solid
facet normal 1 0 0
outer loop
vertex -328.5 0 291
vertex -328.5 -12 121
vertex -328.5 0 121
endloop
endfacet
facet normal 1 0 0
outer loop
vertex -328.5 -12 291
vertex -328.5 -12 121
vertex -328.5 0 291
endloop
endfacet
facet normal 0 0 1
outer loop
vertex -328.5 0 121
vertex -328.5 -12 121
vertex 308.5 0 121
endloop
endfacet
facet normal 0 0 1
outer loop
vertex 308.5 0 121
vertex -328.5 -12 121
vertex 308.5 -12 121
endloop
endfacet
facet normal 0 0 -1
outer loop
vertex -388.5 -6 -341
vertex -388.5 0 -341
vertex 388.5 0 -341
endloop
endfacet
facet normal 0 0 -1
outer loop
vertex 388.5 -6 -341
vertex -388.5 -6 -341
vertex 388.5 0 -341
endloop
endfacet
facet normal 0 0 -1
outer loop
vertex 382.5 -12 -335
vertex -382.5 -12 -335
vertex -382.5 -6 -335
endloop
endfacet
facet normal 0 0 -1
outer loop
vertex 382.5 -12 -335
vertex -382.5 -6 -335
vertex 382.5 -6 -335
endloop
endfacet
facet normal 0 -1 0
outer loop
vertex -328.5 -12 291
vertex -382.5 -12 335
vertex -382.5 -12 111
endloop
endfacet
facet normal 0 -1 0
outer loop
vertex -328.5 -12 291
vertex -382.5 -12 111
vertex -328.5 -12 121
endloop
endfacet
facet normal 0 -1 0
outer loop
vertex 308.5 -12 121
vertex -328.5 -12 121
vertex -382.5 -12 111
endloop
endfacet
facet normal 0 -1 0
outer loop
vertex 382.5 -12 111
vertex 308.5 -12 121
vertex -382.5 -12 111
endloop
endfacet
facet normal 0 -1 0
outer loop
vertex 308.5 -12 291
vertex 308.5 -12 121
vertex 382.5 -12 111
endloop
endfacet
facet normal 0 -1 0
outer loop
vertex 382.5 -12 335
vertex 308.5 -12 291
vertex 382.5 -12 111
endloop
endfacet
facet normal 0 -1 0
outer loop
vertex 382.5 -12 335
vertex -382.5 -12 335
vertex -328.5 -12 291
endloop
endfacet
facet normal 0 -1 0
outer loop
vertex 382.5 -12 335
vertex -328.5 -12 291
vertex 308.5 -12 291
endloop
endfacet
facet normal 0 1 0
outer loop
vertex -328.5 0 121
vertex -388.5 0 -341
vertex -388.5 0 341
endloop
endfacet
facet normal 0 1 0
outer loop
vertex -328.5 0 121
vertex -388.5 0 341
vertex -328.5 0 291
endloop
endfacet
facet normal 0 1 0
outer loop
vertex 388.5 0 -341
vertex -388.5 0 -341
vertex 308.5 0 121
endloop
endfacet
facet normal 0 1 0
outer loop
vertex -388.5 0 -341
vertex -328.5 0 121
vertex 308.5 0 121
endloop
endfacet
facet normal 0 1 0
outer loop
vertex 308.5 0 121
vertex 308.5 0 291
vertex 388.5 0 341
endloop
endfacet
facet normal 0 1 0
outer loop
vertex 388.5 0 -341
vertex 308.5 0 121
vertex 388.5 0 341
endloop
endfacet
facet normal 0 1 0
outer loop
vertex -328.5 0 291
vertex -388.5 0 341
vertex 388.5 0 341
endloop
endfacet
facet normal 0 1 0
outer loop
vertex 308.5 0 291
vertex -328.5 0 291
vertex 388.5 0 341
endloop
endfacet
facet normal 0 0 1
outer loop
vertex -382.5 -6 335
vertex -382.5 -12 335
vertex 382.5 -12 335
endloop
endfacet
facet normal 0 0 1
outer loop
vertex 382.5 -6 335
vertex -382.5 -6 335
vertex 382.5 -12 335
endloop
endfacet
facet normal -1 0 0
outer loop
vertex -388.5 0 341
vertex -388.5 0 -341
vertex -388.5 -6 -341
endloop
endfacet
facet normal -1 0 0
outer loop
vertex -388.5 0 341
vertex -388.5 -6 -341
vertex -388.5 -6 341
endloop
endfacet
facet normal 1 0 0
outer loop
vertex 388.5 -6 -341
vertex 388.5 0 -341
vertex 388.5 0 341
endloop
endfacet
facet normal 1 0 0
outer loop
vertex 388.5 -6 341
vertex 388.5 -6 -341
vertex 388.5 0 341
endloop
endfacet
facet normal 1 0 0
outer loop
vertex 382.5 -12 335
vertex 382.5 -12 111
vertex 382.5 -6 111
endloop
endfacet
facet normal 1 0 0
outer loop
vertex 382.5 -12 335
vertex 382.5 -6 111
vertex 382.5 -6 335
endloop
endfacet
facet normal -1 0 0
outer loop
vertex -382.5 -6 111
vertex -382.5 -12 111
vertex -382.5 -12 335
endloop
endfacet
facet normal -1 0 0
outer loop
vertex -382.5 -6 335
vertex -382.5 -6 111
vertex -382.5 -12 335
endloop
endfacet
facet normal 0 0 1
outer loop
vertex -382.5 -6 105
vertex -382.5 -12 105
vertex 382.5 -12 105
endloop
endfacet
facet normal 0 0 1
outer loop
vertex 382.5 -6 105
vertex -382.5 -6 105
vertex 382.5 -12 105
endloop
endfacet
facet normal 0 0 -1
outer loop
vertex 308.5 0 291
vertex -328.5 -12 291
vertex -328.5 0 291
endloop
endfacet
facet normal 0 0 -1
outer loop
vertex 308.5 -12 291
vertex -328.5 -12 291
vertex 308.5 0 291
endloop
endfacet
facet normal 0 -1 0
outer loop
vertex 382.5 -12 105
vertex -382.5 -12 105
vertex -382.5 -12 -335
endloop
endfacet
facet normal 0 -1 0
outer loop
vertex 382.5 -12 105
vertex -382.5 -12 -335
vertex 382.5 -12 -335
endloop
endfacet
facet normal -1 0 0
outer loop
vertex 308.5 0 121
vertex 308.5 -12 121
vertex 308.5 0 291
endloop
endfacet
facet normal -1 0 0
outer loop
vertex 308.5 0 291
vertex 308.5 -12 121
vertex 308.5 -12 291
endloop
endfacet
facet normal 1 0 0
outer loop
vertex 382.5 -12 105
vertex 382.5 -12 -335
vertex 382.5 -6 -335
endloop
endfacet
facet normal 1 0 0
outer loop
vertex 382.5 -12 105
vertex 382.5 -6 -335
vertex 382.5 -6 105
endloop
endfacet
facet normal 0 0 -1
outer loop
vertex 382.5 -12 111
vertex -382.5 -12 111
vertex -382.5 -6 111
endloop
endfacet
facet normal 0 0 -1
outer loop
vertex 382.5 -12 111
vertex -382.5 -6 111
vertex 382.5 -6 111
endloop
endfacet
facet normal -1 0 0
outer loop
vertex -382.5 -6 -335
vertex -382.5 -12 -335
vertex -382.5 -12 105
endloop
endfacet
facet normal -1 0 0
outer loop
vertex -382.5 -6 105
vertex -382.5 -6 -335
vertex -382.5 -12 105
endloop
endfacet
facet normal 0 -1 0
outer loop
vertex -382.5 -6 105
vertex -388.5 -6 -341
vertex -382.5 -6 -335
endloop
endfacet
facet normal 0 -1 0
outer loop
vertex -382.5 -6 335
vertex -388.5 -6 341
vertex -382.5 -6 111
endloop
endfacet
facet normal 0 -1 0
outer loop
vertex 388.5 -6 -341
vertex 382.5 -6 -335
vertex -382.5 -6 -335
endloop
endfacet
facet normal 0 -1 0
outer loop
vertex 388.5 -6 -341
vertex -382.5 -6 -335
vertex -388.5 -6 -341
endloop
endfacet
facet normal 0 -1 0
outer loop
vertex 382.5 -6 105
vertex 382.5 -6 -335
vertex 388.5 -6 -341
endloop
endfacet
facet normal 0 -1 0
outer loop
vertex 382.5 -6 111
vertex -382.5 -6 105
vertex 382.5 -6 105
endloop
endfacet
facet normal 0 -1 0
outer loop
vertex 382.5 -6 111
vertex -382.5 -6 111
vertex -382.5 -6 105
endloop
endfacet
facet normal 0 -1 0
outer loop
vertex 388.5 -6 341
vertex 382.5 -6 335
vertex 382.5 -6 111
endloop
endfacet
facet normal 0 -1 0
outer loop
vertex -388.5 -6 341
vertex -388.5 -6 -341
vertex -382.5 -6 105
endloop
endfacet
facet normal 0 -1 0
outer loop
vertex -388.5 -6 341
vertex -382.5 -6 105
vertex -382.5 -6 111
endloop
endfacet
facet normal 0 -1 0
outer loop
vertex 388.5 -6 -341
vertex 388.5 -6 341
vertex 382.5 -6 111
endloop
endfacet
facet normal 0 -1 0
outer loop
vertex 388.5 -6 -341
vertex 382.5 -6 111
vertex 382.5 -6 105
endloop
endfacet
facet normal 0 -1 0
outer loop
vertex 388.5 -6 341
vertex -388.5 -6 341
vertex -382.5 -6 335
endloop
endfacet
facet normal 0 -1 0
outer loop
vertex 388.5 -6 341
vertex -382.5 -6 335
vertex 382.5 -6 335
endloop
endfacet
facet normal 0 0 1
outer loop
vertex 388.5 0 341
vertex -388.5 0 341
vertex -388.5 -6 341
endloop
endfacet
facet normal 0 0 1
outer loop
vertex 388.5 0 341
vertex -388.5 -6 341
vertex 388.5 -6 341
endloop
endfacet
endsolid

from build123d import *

# Parameters (mm, degrees)
F0_W      = 777
F0_H      = 682
F1_DEPTH  = 12
F2_W      = 777
F2_H      = 6
F3_DEPTH  = 6
F4_W      = 637
F4_H      = 170
F5_DEPTH  = 12
F6_W      = 777
F6_H      = 6
F7_DEPTH  = 6
F8_W      = 6
F8_H      = 676
F9_DEPTH  = 6
F10_W     = 6
F10_H     = 676
F11_DEPTH = 6
F12_W     = 765
F12_H     = 6
F13_DEPTH = 6


with BuildPart() as f1:
    # F0 (on Front) → F1 (new body)
    with BuildSketch(Plane.XZ):
        Rectangle(F0_W, F0_H)
    extrude(amount=F1_DEPTH)

    # F2 (on face) → F3 (cut)
    with BuildSketch(Plane.XZ.offset(12)):
        with Locations((0, 108)):
            Rectangle(F2_W, F2_H)
    extrude(amount=-F3_DEPTH, mode=Mode.SUBTRACT)

    # F4 (on face) → F5 (cut, through all)
    with BuildSketch(Plane.XZ.offset(12)):
        with Locations((-10, 206)):
            Rectangle(F4_W, F4_H)
    extrude(amount=-F5_DEPTH, mode=Mode.SUBTRACT)

    # F6 (on face) → F7 (cut)
    with BuildSketch(Plane.XZ.offset(12)):
        with Locations((0, 338)):
            Rectangle(F6_W, F6_H)
    extrude(amount=-F7_DEPTH, mode=Mode.SUBTRACT)

    # F8 (on face) → F9 (cut)
    with BuildSketch(Plane.XZ.offset(12)):
        with Locations((-385.5, -3)):
            Rectangle(F8_W, F8_H)
    extrude(amount=-F9_DEPTH, mode=Mode.SUBTRACT)

    # F10 (on face) → F11 (cut)
    with BuildSketch(Plane.XZ.offset(12)):
        with Locations((385.5, -3)):
            Rectangle(F10_W, F10_H)
    extrude(amount=-F11_DEPTH, mode=Mode.SUBTRACT)

    # F12 (on face) → F13 (cut)
    with BuildSketch(Plane.XZ.offset(12)):
        with Locations((0, -338)):
            Rectangle(F12_W, F12_H)
    extrude(amount=-F13_DEPTH, mode=Mode.SUBTRACT)


solid = f1.part
